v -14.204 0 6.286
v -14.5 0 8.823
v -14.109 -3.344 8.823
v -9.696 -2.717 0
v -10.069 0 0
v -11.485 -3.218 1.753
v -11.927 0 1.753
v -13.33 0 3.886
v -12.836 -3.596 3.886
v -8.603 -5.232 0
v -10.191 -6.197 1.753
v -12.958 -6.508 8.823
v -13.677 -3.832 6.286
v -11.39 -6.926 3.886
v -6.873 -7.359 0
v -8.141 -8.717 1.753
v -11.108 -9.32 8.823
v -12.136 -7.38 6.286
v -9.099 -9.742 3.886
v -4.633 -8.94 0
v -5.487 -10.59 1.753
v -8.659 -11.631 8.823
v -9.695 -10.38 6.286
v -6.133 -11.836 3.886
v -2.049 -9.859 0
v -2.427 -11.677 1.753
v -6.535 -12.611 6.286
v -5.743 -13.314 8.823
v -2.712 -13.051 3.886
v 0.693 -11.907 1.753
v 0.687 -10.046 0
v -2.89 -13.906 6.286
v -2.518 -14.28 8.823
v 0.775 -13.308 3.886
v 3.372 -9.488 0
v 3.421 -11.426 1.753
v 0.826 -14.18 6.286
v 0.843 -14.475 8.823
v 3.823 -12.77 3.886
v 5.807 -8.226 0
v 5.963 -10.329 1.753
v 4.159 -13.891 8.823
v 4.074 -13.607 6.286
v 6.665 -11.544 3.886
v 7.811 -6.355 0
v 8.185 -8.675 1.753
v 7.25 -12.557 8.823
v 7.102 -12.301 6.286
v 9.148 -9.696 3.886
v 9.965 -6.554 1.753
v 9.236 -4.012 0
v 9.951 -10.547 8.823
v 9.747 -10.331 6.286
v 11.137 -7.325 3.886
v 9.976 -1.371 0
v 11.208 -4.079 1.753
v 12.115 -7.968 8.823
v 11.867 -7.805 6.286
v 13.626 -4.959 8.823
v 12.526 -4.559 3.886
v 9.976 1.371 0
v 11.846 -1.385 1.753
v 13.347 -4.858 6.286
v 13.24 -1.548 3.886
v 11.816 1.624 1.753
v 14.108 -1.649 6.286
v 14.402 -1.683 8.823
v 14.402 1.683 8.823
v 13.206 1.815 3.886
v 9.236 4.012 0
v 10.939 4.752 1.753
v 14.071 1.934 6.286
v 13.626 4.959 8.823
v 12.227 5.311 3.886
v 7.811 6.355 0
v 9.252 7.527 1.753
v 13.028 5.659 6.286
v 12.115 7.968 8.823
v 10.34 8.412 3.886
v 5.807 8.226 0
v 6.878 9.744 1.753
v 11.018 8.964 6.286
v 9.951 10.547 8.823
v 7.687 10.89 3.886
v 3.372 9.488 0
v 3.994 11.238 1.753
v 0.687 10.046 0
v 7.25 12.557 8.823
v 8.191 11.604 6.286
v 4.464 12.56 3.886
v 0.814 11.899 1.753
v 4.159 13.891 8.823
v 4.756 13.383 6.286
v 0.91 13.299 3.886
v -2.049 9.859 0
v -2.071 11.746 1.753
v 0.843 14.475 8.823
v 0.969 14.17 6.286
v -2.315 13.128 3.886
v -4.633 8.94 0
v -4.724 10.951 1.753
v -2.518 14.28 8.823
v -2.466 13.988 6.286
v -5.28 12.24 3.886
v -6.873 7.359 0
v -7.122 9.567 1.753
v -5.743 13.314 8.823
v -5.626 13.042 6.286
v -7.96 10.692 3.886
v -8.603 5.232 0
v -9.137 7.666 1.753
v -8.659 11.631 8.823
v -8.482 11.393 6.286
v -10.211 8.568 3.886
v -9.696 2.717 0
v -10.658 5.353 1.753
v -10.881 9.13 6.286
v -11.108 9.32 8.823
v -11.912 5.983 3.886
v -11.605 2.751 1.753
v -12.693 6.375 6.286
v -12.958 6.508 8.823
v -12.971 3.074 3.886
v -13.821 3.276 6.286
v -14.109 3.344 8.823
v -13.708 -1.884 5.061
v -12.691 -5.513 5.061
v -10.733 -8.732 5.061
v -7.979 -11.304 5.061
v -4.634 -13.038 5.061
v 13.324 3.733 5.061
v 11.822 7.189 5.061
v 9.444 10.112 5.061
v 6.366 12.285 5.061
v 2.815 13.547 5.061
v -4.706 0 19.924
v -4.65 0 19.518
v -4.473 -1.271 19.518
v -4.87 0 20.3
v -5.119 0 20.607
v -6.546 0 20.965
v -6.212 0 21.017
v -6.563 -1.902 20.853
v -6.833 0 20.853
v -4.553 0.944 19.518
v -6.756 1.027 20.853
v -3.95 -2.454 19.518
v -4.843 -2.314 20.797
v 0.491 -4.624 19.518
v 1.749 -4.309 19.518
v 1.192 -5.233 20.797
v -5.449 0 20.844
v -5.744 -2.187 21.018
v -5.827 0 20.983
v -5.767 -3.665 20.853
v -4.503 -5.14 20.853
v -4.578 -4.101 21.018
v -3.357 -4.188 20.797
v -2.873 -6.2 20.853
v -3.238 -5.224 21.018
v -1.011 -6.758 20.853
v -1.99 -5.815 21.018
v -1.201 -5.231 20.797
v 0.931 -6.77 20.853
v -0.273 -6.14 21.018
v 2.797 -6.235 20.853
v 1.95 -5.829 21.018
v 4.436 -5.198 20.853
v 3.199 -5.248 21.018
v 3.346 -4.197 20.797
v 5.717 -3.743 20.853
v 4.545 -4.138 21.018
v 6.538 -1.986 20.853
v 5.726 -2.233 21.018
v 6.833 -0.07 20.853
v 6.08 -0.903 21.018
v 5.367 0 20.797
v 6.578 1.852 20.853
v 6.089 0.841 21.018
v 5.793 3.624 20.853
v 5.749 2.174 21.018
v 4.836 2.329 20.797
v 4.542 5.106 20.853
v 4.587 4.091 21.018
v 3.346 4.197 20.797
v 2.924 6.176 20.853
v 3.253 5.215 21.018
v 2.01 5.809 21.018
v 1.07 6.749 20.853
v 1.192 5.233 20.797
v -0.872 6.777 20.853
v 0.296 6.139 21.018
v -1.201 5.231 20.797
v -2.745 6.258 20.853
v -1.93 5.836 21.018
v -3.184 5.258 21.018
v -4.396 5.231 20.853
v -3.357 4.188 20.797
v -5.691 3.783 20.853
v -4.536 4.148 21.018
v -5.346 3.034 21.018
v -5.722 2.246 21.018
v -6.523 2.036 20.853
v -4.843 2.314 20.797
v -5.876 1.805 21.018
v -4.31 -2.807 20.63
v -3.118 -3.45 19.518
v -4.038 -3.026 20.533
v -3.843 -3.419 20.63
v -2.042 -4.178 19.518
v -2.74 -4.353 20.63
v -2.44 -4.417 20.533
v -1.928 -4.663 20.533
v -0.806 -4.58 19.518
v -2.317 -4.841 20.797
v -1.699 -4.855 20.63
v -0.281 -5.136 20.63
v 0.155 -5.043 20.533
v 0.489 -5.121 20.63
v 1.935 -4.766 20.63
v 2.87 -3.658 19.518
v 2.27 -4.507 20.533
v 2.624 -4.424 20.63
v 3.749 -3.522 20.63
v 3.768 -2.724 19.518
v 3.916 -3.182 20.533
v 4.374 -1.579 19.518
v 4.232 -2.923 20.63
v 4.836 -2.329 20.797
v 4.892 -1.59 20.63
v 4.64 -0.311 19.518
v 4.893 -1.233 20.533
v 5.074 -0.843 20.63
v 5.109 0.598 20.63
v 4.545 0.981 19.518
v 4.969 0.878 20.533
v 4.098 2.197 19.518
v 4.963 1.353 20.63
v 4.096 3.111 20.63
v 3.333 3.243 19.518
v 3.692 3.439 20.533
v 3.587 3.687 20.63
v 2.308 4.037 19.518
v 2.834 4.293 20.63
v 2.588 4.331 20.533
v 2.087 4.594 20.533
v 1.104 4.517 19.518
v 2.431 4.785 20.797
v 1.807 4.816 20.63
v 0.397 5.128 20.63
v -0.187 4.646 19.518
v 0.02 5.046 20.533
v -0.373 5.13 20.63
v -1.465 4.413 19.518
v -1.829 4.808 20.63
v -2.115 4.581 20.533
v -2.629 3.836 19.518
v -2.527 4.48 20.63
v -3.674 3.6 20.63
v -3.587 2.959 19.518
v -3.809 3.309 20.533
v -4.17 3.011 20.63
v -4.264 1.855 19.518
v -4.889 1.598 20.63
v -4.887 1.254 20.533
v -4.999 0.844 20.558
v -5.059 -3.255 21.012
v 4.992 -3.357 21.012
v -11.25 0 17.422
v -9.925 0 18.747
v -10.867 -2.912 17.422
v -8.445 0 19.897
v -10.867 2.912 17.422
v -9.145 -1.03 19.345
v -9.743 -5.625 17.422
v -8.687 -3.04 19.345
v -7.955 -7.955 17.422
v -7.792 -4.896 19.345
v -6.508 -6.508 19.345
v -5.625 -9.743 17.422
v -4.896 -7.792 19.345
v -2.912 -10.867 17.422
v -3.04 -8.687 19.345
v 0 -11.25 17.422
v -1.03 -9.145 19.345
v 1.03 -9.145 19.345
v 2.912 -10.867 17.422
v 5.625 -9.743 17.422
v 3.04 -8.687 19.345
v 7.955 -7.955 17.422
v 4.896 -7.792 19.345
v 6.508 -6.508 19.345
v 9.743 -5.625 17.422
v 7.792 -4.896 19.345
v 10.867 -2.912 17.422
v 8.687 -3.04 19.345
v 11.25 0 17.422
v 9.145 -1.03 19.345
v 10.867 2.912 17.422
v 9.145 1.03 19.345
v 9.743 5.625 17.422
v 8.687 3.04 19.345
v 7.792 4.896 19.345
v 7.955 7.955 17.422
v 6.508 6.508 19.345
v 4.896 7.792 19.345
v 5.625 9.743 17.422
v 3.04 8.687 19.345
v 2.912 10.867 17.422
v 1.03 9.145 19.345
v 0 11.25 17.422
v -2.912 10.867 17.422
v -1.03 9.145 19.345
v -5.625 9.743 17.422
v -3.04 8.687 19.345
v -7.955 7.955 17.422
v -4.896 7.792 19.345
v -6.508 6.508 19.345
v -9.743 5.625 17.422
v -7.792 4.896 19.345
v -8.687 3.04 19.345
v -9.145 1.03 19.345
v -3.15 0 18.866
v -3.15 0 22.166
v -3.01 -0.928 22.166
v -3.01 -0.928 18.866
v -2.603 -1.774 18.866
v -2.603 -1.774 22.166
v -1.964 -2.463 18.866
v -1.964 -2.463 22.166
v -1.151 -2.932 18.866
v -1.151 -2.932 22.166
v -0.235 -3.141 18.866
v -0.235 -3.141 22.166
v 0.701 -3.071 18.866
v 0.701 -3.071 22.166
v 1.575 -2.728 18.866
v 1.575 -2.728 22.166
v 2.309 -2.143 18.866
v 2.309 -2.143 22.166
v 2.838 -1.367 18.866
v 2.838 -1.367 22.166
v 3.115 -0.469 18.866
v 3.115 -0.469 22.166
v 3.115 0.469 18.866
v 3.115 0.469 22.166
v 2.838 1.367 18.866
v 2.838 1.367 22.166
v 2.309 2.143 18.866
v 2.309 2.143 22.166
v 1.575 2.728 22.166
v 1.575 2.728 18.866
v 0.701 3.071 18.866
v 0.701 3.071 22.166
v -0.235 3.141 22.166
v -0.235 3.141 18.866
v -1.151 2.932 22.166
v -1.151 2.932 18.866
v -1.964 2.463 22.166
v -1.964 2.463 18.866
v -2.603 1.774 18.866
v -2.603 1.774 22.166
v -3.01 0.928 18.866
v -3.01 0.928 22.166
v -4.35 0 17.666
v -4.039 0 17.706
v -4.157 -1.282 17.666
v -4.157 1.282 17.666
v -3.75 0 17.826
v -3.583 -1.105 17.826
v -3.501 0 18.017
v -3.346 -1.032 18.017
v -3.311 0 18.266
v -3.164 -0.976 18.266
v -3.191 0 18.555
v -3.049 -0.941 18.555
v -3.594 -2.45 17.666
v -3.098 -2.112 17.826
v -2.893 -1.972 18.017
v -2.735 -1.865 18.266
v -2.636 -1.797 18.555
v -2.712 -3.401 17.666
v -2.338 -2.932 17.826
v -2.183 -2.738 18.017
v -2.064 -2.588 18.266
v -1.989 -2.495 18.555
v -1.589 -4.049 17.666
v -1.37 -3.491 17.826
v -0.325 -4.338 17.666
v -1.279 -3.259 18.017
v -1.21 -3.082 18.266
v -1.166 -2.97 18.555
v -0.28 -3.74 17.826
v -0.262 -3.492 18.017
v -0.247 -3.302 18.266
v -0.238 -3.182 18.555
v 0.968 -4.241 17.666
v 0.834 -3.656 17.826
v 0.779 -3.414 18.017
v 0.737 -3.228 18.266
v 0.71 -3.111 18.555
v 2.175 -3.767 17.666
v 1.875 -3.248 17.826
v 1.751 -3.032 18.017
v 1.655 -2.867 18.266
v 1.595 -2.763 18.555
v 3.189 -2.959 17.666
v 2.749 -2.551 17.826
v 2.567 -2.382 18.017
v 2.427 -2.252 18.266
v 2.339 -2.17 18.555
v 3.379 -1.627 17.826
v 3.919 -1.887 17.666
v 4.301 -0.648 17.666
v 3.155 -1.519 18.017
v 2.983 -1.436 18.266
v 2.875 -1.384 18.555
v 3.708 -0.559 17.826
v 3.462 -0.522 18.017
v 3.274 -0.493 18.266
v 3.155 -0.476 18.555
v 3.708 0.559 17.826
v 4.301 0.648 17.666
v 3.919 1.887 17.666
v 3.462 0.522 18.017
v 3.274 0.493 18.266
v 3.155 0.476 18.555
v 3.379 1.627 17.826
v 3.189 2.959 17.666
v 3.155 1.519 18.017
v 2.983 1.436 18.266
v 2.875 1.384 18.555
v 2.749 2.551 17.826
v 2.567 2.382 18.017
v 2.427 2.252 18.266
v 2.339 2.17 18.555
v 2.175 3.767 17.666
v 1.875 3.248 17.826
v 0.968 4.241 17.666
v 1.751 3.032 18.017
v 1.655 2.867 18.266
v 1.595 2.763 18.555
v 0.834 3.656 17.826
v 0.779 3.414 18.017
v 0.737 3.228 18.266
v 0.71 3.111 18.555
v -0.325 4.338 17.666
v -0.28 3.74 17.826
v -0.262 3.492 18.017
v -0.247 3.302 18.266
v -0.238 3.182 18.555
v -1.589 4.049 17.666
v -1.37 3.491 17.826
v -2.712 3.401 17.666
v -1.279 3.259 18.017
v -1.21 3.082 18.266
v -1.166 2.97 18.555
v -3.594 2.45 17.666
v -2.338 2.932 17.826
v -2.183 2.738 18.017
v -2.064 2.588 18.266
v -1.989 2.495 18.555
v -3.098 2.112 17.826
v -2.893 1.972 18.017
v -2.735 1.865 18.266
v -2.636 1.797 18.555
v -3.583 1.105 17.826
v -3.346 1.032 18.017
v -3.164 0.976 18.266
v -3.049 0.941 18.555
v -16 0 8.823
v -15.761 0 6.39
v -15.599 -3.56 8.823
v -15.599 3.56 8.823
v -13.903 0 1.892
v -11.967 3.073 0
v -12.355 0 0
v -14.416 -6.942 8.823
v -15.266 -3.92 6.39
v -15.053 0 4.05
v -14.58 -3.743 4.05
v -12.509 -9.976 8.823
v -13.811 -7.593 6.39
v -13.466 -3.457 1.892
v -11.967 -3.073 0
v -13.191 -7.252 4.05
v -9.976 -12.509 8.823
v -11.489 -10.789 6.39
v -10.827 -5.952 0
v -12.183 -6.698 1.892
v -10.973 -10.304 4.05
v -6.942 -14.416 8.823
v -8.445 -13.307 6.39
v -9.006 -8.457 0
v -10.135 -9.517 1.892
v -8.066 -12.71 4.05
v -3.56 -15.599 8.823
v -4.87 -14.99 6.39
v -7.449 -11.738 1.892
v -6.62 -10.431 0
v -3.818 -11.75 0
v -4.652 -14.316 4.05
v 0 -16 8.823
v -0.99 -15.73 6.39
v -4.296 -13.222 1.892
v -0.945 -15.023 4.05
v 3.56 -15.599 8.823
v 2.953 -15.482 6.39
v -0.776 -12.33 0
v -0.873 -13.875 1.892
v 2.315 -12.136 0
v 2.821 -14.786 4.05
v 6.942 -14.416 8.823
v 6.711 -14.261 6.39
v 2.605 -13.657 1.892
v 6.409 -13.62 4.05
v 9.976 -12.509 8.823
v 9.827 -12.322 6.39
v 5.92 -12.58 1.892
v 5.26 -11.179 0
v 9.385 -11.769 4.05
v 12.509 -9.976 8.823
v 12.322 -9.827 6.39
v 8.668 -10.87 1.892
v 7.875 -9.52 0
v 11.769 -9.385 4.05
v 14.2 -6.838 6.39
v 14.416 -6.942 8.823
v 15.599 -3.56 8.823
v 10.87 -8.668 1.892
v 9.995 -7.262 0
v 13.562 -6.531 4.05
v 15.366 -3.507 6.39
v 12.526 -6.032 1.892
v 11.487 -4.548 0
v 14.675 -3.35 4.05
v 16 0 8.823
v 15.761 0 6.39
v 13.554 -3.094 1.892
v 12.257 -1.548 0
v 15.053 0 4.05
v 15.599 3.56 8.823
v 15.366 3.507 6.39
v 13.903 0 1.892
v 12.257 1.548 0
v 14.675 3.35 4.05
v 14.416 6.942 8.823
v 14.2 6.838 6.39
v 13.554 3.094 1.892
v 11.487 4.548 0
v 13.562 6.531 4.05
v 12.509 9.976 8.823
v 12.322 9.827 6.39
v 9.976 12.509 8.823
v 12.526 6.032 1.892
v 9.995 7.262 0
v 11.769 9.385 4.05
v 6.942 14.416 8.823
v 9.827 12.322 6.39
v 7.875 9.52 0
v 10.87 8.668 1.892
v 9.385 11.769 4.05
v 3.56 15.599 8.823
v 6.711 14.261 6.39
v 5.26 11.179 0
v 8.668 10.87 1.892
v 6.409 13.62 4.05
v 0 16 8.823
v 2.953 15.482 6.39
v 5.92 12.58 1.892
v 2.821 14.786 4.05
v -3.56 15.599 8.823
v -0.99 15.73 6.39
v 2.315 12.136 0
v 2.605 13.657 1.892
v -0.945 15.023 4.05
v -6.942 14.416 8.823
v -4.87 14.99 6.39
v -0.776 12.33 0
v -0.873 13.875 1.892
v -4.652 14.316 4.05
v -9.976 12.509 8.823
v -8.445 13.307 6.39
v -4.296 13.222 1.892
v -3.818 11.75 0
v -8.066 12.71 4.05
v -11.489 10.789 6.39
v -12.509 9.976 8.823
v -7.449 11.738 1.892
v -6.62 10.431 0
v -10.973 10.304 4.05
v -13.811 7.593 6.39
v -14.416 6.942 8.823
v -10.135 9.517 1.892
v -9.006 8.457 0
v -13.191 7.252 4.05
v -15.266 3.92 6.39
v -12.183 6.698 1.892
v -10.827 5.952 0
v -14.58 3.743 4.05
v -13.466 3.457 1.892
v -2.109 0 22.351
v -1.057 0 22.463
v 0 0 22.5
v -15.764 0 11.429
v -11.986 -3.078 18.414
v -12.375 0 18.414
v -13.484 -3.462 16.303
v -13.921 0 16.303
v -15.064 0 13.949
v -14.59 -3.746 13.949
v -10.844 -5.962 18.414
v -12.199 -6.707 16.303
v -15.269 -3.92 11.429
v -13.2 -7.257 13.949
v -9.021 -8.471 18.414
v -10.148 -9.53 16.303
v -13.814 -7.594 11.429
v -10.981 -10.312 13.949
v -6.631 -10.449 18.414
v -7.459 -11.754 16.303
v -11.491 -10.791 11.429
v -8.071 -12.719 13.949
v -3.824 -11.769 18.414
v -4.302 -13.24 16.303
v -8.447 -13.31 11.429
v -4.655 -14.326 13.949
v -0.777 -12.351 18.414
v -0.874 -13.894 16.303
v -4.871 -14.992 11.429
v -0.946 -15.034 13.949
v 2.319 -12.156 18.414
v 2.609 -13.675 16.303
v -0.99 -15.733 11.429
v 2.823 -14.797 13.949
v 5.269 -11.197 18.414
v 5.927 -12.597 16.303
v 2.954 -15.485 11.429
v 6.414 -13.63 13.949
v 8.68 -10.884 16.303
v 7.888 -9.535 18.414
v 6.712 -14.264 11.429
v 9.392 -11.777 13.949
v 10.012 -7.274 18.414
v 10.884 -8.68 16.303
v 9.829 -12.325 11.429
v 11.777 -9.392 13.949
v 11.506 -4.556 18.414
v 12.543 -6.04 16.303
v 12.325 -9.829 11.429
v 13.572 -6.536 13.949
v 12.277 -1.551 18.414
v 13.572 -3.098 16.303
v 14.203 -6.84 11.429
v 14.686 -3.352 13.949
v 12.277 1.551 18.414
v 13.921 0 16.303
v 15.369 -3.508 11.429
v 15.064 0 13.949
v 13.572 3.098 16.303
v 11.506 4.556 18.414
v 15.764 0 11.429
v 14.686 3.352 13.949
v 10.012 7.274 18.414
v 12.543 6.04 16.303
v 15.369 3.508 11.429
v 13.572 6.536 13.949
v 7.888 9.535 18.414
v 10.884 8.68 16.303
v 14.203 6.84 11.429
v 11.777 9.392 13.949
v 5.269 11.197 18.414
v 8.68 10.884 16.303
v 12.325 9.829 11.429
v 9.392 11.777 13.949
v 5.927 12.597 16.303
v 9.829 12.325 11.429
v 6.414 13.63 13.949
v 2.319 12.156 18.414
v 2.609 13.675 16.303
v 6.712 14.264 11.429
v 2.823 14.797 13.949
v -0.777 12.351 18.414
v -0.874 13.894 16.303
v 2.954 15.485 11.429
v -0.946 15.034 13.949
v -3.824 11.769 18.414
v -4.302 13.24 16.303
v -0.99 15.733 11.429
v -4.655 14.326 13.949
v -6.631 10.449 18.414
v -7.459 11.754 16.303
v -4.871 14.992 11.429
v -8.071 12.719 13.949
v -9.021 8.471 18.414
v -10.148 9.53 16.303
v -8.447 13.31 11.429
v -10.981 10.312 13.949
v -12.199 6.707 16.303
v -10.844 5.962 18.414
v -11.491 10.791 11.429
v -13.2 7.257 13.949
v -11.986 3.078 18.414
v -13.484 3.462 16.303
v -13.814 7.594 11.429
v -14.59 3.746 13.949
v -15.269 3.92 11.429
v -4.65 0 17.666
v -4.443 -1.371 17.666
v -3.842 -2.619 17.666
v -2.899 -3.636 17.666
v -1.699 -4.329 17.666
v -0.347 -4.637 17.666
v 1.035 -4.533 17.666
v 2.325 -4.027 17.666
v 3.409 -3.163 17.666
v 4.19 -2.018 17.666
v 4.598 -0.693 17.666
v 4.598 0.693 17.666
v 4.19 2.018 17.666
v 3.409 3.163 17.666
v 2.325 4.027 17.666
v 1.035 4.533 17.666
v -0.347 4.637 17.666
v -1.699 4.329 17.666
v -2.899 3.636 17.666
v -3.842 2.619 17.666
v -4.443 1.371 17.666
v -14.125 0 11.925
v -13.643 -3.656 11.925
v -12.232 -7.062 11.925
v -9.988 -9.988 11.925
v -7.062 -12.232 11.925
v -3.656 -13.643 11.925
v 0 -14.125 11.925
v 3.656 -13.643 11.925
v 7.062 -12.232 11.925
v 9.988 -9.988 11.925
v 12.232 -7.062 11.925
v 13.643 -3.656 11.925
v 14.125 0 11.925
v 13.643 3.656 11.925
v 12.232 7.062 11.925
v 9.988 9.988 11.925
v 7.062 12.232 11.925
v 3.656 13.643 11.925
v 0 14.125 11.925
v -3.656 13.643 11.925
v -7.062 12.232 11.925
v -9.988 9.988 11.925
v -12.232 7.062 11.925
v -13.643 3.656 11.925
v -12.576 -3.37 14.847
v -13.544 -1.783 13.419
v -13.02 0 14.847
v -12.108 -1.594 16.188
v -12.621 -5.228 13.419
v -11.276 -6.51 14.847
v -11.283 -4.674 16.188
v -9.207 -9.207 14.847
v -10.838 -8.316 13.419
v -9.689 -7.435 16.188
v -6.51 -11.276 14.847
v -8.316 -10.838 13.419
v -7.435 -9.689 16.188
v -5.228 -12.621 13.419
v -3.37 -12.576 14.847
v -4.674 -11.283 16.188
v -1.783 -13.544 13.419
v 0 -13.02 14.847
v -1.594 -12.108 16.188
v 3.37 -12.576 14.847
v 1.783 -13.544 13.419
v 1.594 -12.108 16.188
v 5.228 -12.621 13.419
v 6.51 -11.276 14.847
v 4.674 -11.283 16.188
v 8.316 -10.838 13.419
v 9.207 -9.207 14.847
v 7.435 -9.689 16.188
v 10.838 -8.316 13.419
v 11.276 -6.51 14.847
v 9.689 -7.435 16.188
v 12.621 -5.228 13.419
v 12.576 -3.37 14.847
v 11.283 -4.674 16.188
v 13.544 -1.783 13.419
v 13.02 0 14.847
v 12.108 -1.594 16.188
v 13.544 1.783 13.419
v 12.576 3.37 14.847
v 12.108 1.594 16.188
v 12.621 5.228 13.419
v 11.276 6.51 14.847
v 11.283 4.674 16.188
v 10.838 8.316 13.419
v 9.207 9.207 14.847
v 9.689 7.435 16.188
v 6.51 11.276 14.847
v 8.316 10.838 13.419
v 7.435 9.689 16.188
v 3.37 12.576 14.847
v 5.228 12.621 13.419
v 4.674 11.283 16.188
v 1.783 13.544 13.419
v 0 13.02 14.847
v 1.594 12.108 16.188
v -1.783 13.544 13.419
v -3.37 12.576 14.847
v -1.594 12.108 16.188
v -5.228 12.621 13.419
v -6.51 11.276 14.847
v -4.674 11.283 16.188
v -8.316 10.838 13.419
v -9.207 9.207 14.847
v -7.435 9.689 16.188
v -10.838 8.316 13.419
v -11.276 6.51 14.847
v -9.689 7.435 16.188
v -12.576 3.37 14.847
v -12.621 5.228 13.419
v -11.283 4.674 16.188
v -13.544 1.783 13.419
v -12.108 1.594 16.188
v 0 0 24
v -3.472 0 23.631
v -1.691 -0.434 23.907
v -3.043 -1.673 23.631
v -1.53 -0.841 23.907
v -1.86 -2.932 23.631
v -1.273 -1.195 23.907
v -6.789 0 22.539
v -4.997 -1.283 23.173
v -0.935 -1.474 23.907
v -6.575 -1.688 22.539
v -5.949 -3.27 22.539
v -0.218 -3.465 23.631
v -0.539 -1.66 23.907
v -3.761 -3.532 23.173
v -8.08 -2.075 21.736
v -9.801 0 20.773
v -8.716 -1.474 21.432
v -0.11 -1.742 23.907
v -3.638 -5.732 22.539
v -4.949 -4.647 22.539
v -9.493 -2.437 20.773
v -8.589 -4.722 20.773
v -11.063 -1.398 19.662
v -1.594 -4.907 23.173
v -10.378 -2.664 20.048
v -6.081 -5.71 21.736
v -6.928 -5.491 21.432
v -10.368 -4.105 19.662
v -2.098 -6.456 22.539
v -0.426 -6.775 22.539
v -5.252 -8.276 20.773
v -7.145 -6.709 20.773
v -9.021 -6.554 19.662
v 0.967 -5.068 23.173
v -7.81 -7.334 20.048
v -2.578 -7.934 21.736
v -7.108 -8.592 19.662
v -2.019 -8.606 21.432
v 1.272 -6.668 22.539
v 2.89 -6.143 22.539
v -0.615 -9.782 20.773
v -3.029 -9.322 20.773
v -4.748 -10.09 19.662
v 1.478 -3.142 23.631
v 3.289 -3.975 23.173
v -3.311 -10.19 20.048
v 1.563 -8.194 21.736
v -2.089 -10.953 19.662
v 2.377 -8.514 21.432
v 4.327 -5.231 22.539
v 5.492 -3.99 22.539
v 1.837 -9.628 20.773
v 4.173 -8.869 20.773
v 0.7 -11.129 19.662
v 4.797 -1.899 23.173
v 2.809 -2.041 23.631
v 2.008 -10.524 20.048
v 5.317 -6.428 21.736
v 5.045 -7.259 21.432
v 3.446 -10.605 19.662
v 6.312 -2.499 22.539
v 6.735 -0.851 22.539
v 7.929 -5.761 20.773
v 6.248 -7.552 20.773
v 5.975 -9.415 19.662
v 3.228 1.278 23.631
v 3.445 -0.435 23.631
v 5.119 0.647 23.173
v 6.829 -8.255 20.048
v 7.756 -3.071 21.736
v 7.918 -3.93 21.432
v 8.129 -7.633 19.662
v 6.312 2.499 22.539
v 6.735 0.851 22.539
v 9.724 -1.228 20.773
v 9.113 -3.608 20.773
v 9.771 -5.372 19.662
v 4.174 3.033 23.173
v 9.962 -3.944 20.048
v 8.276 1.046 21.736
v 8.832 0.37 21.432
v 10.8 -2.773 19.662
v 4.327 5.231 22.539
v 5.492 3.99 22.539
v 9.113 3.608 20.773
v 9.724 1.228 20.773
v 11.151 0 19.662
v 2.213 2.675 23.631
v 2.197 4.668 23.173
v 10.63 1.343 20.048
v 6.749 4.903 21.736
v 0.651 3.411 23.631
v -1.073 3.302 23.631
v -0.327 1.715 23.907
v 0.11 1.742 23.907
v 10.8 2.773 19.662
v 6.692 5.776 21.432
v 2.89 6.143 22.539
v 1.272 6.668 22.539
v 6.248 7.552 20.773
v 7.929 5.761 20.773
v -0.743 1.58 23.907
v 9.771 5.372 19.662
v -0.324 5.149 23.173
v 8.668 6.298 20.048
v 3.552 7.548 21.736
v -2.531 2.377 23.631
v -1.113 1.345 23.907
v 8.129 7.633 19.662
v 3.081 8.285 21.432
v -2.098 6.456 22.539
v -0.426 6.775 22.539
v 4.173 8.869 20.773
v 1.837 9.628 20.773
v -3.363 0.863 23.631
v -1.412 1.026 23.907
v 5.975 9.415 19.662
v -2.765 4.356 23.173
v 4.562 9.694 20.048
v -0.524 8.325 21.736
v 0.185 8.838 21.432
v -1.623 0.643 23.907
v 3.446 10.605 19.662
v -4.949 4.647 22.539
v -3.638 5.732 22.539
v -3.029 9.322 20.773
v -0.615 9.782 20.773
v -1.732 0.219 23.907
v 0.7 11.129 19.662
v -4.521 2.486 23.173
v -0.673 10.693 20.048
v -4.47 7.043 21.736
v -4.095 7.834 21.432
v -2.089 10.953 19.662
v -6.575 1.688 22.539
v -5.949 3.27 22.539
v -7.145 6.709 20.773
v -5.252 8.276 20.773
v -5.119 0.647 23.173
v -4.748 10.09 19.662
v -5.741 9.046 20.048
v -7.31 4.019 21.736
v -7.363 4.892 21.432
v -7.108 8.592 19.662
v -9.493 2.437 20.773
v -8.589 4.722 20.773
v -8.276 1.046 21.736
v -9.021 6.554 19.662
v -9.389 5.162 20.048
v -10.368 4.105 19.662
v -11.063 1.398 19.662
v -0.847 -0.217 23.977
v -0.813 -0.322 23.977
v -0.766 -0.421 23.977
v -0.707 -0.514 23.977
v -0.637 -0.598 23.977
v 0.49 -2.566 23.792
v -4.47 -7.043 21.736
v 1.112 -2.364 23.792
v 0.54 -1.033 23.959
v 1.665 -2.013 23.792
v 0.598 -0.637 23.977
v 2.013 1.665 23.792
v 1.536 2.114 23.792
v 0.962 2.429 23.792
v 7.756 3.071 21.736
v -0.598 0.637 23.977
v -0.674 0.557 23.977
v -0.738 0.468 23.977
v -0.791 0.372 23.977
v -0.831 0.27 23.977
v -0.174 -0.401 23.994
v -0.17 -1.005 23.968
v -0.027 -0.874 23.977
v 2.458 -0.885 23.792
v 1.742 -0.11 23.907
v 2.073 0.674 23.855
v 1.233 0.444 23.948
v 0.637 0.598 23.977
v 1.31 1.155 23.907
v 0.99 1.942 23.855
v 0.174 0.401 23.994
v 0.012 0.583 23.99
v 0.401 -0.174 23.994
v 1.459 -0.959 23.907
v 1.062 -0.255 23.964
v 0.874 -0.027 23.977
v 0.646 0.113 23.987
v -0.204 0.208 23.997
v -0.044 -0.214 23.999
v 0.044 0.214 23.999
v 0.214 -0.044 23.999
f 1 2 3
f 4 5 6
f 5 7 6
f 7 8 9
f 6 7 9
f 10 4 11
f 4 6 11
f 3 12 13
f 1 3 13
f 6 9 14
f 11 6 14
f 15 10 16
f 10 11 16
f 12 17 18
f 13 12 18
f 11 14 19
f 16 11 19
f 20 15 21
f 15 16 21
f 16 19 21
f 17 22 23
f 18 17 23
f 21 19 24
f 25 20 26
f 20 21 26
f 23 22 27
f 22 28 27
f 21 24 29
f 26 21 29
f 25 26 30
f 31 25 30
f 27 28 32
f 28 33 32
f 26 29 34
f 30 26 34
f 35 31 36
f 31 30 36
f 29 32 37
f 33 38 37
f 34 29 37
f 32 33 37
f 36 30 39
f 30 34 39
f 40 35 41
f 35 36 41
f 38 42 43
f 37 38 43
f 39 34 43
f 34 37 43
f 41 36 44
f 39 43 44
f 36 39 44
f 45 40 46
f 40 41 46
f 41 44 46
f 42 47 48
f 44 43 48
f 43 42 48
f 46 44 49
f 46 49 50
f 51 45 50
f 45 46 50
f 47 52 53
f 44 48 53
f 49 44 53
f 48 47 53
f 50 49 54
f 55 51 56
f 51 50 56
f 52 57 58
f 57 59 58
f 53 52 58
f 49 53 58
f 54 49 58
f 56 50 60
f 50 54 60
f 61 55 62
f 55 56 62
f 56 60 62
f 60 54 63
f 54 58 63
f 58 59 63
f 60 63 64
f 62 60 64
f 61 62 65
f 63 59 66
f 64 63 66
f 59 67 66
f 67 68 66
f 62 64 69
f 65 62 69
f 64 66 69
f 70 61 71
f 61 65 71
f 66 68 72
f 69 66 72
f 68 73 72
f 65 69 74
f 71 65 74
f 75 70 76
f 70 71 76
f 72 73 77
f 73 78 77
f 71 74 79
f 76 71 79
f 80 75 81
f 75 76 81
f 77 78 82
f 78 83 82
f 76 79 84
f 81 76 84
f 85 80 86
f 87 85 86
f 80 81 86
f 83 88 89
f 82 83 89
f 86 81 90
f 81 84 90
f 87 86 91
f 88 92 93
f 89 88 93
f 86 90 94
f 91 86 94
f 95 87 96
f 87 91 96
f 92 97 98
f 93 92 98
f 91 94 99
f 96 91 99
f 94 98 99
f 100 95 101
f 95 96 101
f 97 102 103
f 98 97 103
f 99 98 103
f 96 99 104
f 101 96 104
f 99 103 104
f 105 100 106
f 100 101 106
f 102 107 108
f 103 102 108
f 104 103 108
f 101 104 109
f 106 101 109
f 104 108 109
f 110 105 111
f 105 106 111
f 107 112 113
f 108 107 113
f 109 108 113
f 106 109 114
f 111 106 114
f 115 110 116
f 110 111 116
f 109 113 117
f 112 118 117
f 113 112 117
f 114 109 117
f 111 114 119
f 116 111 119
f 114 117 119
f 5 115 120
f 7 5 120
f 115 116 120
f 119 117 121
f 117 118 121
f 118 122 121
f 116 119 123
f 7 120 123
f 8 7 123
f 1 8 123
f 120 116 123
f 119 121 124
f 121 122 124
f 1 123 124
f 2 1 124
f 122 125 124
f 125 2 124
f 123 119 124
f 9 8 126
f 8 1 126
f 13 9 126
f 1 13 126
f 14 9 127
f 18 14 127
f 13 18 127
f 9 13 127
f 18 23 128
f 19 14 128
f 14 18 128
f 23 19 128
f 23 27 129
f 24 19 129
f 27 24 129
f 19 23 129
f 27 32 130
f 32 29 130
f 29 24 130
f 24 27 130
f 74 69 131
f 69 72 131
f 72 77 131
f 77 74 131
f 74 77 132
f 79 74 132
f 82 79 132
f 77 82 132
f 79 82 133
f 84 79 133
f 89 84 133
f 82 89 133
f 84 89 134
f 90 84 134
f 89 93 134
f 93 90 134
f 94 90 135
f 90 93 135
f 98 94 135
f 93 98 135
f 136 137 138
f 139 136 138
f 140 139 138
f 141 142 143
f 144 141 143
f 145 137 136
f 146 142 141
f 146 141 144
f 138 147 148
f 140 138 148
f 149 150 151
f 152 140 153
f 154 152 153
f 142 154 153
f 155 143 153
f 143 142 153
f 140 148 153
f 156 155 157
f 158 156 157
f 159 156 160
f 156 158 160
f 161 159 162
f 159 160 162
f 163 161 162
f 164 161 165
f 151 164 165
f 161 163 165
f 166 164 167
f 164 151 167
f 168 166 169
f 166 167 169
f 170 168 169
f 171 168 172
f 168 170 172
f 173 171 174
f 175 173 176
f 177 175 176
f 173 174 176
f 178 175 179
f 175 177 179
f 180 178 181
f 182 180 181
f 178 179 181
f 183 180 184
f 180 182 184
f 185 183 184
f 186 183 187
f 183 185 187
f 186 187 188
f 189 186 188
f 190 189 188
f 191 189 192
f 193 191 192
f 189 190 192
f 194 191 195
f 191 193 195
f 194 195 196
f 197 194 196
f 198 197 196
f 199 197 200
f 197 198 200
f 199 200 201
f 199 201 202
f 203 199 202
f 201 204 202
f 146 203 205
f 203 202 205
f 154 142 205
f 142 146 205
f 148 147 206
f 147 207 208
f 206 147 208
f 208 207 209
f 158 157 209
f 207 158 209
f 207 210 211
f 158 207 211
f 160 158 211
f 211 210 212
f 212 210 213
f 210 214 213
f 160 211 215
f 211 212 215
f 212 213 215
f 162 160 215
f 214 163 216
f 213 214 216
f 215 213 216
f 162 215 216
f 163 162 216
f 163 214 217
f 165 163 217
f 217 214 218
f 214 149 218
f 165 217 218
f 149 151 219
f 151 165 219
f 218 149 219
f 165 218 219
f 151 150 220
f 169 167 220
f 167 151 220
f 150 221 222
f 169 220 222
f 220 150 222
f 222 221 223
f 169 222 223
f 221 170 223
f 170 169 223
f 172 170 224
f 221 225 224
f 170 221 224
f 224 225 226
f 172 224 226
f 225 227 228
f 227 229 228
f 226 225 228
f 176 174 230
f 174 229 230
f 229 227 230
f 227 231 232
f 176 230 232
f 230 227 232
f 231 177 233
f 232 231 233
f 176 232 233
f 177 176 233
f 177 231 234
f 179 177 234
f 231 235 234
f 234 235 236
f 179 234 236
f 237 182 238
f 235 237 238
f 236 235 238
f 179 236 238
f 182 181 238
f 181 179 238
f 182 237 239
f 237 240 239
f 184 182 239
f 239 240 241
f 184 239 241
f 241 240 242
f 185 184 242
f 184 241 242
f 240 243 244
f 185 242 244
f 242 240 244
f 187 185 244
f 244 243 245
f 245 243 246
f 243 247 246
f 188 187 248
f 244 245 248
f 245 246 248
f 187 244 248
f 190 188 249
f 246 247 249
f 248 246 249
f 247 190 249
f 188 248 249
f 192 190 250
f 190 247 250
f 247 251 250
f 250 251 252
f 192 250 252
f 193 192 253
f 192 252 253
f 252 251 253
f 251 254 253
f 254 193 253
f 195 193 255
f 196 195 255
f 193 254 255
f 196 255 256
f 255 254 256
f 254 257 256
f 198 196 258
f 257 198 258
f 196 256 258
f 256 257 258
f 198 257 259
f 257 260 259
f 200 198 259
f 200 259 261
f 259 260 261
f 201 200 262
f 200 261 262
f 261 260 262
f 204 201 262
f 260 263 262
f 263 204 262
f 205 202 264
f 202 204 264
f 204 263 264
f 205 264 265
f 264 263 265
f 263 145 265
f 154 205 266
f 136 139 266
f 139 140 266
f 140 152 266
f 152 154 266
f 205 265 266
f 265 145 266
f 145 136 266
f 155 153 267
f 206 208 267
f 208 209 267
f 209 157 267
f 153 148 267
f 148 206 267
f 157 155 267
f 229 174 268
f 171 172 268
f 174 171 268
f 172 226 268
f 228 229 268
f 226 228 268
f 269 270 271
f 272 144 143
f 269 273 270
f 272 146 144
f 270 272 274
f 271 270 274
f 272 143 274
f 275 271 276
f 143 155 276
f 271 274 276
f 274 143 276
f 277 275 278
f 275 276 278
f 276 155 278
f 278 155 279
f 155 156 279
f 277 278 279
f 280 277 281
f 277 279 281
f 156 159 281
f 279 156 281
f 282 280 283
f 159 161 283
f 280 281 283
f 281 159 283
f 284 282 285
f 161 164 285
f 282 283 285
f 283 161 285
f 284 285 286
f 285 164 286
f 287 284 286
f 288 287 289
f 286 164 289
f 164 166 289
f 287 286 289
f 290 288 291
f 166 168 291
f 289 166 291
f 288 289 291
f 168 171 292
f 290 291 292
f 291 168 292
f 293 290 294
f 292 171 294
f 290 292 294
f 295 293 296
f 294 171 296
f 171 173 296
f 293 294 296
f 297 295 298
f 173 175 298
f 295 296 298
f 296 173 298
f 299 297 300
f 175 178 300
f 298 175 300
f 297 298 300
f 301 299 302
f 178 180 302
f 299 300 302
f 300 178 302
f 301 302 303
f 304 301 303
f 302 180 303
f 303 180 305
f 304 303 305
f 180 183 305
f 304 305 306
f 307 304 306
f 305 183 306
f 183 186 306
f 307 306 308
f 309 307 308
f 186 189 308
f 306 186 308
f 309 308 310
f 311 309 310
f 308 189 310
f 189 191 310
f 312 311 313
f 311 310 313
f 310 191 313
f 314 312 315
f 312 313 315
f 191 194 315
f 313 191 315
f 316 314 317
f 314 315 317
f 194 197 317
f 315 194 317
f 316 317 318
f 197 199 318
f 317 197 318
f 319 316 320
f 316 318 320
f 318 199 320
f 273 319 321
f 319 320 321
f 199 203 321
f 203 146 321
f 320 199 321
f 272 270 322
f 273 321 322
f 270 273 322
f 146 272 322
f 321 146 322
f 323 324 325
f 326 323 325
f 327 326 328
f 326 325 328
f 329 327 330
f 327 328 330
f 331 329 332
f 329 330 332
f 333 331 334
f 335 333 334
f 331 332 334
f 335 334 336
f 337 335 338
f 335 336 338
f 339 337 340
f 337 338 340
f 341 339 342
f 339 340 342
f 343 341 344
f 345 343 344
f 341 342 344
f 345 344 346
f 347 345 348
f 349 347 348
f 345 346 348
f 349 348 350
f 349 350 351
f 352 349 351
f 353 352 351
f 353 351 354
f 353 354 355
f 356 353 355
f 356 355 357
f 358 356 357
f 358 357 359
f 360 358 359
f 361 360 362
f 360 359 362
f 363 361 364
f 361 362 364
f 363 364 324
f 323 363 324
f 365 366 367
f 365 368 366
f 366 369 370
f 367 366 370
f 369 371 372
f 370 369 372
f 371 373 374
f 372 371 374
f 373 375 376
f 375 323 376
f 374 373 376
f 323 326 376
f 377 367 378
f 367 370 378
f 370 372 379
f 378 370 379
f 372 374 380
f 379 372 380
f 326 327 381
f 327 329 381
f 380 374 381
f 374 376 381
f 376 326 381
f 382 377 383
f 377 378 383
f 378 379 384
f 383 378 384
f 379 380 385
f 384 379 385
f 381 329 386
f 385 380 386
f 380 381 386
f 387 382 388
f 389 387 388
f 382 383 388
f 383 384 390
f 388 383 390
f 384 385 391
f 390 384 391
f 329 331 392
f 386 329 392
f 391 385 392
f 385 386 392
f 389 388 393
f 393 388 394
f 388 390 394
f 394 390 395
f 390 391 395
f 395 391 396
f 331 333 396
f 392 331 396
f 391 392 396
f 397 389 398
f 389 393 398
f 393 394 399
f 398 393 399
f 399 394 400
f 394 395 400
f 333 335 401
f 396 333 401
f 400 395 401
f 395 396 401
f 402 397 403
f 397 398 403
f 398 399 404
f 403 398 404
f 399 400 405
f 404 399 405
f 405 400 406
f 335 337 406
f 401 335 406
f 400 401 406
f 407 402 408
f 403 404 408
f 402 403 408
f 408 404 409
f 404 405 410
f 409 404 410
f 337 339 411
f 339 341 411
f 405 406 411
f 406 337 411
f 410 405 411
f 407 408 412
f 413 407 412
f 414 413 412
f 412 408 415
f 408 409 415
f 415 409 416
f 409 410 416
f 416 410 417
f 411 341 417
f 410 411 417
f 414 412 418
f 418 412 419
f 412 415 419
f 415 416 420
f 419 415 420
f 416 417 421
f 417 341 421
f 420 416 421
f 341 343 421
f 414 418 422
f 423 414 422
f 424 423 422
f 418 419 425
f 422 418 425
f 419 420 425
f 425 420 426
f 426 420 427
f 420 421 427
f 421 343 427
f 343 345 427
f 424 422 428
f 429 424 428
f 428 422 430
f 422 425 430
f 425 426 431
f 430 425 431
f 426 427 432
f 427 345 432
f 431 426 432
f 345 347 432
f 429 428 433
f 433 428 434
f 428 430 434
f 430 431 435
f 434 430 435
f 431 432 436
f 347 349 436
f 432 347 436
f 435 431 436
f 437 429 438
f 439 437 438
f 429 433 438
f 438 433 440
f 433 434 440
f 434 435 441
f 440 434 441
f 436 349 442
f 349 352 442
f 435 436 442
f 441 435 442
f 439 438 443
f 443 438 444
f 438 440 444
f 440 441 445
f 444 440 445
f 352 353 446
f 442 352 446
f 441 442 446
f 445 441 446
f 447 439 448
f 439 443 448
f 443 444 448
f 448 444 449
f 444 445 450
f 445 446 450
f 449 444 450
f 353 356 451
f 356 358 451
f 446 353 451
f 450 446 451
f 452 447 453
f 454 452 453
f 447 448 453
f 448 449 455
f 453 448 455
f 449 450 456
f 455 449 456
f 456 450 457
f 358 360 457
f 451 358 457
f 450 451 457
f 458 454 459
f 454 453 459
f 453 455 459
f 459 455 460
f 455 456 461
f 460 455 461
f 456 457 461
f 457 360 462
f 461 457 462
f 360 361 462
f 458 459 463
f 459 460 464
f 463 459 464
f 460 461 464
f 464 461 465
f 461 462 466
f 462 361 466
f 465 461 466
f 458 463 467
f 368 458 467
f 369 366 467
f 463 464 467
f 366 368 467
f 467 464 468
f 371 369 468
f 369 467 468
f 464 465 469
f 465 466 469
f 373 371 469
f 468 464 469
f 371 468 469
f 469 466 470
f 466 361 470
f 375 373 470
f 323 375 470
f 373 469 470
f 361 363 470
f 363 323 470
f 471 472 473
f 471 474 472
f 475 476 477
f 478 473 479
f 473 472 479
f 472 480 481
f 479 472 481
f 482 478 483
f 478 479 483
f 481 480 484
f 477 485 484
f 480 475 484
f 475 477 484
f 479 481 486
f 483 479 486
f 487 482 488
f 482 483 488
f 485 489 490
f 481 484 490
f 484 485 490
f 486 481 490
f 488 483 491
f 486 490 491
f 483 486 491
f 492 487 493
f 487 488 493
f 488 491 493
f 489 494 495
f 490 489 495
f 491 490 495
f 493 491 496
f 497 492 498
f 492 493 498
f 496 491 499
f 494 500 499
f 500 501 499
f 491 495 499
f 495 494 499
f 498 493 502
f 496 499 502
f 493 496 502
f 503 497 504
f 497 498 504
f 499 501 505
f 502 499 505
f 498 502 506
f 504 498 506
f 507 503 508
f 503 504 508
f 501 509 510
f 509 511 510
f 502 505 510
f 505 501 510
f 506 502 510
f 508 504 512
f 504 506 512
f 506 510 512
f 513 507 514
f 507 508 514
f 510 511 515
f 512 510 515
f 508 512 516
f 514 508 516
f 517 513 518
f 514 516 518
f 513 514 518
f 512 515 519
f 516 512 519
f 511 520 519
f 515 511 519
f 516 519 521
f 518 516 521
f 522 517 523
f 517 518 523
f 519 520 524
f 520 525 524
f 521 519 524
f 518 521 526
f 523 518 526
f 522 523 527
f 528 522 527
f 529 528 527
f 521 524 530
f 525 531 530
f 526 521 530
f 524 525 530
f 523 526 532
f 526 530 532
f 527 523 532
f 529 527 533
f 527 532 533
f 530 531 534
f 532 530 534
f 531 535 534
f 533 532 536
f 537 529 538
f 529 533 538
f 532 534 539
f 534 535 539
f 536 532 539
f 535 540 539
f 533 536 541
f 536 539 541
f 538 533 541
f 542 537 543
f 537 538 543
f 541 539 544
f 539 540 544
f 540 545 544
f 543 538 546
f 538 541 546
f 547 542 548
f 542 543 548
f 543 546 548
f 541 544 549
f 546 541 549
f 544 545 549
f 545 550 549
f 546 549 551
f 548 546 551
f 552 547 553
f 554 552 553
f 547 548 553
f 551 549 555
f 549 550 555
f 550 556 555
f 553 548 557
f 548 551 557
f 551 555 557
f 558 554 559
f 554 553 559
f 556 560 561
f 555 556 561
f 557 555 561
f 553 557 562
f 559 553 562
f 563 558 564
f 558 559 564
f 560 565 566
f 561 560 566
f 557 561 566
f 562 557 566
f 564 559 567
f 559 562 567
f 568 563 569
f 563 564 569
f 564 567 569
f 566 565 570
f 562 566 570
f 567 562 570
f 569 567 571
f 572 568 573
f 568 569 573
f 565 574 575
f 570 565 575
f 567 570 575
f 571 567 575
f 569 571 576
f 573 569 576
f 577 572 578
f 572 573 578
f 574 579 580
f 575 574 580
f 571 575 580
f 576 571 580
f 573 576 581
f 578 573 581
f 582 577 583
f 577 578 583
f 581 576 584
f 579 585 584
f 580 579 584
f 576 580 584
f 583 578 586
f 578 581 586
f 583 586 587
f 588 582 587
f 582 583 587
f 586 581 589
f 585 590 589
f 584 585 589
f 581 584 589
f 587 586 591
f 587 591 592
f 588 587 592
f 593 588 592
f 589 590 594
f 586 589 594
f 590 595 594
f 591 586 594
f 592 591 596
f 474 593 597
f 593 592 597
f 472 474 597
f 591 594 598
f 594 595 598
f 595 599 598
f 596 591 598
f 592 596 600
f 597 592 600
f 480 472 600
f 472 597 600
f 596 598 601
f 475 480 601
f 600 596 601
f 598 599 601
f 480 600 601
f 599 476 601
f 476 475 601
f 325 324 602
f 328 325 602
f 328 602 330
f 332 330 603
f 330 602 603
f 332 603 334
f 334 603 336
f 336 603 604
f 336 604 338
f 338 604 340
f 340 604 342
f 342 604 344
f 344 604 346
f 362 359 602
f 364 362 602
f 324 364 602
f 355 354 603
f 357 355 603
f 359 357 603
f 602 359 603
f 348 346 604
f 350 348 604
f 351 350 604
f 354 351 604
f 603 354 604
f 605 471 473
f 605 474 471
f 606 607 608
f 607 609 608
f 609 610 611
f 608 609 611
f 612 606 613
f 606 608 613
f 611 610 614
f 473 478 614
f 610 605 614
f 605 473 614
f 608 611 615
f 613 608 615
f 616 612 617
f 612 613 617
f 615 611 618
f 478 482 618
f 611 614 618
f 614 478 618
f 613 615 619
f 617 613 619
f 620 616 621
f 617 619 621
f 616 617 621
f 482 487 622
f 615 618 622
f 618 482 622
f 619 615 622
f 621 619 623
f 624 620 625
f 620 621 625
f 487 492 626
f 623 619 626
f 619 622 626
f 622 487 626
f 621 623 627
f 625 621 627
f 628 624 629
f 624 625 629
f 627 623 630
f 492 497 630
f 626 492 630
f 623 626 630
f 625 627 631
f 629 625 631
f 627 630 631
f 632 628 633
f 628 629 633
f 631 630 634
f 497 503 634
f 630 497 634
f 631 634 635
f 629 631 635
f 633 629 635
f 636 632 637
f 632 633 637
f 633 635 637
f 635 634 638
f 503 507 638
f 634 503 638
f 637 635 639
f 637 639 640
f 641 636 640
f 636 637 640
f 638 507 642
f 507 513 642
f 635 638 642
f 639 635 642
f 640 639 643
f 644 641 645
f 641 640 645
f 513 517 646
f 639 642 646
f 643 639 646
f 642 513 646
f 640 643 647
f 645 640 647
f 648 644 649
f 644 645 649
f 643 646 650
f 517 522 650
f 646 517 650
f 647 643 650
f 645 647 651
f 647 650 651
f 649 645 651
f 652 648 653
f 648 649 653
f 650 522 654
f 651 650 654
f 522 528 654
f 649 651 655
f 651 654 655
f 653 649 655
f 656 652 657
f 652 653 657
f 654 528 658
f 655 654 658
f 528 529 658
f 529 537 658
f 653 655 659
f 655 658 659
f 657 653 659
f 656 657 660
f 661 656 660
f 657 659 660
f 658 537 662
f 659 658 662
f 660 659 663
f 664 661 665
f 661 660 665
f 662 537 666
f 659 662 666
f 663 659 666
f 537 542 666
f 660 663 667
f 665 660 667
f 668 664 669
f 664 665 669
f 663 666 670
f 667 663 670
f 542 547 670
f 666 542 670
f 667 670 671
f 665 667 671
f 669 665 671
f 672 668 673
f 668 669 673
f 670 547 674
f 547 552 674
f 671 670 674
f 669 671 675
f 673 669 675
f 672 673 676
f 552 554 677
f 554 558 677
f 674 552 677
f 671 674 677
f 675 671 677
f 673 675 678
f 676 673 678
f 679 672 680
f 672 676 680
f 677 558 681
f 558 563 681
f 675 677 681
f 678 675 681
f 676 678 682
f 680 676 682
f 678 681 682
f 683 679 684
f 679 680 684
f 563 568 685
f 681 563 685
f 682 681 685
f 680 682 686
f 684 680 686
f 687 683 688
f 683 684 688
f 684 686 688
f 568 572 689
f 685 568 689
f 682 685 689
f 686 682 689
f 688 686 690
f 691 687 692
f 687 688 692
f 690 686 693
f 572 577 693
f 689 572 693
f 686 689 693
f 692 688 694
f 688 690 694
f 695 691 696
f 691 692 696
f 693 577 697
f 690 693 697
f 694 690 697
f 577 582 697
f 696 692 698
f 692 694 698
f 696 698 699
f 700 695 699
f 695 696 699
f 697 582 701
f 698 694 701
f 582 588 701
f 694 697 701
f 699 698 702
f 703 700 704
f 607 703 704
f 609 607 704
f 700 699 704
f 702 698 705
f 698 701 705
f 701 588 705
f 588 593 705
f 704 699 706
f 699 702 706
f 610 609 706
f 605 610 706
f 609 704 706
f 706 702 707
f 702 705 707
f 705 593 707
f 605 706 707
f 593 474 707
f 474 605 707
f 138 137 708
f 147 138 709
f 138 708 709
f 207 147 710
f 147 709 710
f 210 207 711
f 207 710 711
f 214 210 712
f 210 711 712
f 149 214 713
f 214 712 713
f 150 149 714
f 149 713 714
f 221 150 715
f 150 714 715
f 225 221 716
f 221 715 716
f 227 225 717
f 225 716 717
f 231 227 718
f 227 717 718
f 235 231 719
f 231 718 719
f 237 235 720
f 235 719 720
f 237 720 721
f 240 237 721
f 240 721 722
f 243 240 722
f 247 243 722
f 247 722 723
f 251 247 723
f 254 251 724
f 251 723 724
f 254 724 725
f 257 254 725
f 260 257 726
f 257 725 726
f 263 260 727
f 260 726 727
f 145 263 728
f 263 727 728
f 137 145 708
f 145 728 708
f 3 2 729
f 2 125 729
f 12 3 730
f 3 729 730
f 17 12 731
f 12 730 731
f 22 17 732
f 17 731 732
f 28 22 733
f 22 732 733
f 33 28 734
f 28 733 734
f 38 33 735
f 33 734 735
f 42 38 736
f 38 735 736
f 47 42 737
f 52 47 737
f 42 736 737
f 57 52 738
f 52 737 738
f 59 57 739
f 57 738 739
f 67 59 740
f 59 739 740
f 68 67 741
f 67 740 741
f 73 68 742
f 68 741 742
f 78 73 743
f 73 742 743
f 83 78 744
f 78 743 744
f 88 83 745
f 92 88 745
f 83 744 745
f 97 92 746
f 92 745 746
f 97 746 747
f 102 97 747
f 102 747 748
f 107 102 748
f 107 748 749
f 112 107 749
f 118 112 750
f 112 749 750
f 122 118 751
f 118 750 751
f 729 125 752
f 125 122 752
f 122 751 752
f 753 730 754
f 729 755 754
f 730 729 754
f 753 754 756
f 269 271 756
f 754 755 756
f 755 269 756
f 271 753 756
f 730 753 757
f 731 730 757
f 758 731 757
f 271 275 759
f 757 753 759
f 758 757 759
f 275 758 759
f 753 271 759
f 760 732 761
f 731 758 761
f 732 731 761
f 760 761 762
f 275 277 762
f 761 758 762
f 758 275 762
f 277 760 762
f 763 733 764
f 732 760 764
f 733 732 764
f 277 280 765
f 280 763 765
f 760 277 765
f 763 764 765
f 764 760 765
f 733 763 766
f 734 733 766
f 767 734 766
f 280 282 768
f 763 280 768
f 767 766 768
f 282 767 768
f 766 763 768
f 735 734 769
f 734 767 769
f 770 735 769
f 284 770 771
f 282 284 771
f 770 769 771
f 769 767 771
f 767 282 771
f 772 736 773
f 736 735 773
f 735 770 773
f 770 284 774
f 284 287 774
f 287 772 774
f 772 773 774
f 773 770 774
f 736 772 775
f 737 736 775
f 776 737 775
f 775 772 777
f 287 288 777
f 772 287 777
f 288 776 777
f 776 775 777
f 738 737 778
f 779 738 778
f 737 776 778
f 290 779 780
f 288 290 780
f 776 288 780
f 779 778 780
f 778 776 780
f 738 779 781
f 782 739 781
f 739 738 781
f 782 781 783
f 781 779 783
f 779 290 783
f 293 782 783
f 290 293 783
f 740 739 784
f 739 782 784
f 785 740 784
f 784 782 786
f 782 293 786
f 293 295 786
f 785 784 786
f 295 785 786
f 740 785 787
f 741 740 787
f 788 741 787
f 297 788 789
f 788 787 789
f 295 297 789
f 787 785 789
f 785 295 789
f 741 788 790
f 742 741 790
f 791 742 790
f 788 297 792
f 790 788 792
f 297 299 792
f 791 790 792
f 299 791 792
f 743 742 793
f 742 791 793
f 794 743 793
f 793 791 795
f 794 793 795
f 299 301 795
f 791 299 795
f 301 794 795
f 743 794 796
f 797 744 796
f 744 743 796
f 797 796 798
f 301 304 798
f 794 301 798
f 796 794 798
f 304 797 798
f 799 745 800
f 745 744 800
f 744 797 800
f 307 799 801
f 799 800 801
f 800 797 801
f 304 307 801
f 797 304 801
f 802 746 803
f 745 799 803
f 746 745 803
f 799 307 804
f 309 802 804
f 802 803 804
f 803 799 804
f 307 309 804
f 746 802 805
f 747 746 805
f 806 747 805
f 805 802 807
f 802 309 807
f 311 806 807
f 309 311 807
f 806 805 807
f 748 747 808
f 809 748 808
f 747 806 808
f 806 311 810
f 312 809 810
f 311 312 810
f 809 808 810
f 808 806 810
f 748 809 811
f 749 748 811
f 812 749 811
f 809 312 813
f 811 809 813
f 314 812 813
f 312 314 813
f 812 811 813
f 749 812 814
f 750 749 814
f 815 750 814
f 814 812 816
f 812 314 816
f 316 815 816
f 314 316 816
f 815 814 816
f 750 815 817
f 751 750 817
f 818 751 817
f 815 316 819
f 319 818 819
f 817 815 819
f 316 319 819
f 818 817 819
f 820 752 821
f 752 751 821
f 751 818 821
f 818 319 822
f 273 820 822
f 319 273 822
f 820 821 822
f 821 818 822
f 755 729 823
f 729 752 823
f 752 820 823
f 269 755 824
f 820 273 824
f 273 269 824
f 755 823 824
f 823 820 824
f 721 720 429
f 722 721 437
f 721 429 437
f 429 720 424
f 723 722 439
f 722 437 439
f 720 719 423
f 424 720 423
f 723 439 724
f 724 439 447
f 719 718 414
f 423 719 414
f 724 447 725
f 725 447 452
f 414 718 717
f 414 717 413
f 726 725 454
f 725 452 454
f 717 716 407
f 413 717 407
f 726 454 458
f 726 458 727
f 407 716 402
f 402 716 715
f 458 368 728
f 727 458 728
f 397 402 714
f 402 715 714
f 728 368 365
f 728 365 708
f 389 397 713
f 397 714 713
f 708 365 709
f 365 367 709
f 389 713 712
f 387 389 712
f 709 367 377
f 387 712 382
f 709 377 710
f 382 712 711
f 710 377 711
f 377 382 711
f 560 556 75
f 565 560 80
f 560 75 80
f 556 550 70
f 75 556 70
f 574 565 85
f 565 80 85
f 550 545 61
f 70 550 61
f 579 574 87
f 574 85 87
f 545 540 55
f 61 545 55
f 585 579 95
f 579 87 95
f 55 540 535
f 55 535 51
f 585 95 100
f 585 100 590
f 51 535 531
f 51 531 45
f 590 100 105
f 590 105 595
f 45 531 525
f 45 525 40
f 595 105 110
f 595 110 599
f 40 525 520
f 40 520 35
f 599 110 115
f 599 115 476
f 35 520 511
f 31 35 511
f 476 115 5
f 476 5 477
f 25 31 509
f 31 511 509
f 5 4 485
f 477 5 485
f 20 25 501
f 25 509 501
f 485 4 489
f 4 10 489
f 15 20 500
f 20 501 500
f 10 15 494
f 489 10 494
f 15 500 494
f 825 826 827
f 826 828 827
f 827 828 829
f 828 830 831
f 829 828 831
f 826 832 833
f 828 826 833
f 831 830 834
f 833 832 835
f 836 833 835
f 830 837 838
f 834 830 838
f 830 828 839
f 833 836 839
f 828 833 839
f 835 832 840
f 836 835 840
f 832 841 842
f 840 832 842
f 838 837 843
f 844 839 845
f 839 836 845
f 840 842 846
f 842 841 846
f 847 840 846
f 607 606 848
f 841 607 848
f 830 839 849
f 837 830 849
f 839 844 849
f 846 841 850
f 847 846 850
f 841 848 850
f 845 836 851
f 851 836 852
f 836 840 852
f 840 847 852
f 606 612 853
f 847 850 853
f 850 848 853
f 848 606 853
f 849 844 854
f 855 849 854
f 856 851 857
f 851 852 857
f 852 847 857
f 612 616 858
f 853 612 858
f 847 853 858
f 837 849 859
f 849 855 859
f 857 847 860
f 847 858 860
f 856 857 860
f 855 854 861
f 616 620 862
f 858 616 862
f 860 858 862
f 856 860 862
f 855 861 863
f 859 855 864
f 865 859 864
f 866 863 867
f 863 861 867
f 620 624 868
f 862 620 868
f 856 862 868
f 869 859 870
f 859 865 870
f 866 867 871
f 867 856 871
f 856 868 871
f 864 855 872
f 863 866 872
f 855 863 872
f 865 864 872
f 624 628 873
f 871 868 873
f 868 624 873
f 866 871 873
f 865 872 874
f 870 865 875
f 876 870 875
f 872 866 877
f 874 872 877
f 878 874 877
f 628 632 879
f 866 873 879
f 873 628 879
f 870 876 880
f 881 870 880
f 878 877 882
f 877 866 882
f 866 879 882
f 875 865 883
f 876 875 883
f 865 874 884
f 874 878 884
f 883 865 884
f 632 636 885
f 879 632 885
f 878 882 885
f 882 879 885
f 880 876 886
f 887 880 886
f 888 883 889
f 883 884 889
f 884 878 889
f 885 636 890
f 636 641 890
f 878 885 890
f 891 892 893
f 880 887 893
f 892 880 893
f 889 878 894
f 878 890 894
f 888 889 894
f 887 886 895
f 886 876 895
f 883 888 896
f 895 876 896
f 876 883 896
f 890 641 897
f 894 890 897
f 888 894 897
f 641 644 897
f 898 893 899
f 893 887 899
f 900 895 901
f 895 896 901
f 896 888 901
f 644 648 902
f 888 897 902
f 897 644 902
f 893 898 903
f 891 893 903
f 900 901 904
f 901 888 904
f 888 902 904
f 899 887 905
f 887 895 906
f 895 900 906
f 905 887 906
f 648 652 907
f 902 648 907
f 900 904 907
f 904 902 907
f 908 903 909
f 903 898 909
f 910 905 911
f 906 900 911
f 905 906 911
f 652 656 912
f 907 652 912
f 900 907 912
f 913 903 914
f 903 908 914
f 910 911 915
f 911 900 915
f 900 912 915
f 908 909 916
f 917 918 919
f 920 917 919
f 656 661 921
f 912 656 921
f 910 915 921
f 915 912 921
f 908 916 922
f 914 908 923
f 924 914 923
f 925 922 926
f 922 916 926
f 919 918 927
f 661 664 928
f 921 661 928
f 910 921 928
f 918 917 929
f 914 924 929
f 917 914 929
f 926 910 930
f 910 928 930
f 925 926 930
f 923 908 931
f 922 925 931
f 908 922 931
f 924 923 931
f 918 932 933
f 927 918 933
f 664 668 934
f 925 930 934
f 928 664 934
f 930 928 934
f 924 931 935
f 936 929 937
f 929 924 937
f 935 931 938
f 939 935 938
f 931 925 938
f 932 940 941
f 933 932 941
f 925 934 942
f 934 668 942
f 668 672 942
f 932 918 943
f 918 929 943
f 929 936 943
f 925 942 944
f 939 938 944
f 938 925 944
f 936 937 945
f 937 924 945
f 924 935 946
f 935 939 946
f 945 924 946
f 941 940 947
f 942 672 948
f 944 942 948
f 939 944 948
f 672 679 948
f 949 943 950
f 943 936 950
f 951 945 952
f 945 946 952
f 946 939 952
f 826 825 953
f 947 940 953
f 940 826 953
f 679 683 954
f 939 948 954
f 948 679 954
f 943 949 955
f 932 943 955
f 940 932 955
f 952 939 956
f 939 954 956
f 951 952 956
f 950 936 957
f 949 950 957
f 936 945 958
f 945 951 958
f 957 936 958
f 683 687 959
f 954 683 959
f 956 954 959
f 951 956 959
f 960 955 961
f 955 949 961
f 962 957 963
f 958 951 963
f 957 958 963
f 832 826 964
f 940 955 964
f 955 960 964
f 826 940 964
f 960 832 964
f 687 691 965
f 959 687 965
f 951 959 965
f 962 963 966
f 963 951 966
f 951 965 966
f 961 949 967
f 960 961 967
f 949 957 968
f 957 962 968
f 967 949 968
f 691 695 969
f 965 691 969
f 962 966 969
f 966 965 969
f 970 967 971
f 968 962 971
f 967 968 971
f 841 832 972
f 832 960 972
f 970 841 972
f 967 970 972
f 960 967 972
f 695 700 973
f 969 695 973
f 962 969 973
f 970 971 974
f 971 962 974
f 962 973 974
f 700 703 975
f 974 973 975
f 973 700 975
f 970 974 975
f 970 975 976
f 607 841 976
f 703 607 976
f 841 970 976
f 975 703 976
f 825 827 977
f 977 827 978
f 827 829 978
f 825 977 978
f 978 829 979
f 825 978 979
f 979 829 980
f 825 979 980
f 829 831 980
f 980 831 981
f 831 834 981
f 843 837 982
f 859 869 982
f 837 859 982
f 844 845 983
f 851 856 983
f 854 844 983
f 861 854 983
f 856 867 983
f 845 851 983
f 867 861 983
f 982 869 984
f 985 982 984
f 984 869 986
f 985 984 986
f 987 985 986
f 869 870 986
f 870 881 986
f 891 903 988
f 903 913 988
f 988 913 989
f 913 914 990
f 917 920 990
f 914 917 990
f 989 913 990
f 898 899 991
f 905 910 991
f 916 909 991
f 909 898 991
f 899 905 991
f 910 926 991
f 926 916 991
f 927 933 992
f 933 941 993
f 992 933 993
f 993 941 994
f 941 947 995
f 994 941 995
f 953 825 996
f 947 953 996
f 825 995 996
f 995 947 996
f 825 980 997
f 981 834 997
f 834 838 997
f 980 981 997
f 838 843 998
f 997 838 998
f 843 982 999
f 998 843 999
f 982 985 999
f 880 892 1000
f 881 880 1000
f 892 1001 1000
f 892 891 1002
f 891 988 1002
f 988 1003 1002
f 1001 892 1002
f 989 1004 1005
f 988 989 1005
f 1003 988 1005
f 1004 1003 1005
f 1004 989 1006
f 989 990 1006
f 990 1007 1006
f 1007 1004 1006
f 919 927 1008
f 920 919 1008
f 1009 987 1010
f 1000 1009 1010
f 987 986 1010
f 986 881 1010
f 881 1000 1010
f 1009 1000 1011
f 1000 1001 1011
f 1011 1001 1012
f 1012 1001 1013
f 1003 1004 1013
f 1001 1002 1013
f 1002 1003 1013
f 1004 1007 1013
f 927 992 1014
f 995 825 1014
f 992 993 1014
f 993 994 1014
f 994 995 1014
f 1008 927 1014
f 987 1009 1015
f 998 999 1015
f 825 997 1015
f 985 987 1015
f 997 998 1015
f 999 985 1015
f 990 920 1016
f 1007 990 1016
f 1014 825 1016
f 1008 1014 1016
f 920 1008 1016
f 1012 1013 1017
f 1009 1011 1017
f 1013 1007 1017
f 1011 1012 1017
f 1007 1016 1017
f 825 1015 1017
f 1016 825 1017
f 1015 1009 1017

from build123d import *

# Parameters (mm, degrees)
F2_R = 1.2
F3_R = 1.5


# Not quite as in the source:
# - ends of sketch curves that miss each other by under 0.0002 mm in the source are joined


with BuildPart() as f1:
    # F0 (on Front) → F1 (revolve)
    with BuildSketch(Plane.XZ):
        with BuildLine():
            ThreePointArc((-3.15, 22.1655207886), (-3.905240004, 21.9827173041), (-4.65, 21.7610483486))
            Line((-4.65, 21.7610483486), (-4.65, 17.6655207886))
            Line((-4.65, 17.6655207886), (-3.15, 17.6655207886))
            Line((-3.15, 17.6655207886), (-3.15, 22.1655207886))
        make_face()
        with BuildLine():
            ThreePointArc((-11.2499970039, 17.4215708138), (-8.2407671062, 20.0335452886), (-4.65, 21.7610483486))
            ThreePointArc((-4.65, 21.7610483486), (-3.905240004, 21.9827173041), (-3.15, 22.1655207886))
            ThreePointArc((-3.15, 22.1655207886), (-1.583854187, 22.416145813), (0, 22.5))
            Line((0, 22.5), (0, 24))
            ThreePointArc((0, 24), (-6.7887220518, 22.5387255473), (-12.3749970039, 18.4137281594))
            ThreePointArc((-12.3749970039, 18.4137281594), (-15.0635072272, 13.9494024613), (-16, 8.8228761085))
            ThreePointArc((-16, 8.8228761085), (-15.0528039963, 4.0497512852), (-12.3547648239, 0))
            Line((-12.3547648239, 0), (-10.0693874848, 0))
            ThreePointArc((-10.0693874848, 0), (-13.3301386312, 3.8864435265), (-14.4999996005, 8.8228761085))
            ThreePointArc((-14.4999996005, 8.8228761085), (-13.6603854135, 13.4190720223), (-11.2499970039, 17.4215708138))
        make_face()
    revolve(axis=Axis((0, 0, 23.25), (0, 0, 1)))

    # F2
    f2_edges = [f1.edges().sort_by_distance(p)[0] for p in [
        (3.15, 0, 17.665521),
    ]]
    fillet(f2_edges, radius=F2_R)

    # F3
    f3_edges = [f1.edges().sort_by_distance(p)[0] for p in [
        (4.65, 0, 21.761048),
    ]]
    fillet(f3_edges, radius=F3_R)


solid = f1.part
